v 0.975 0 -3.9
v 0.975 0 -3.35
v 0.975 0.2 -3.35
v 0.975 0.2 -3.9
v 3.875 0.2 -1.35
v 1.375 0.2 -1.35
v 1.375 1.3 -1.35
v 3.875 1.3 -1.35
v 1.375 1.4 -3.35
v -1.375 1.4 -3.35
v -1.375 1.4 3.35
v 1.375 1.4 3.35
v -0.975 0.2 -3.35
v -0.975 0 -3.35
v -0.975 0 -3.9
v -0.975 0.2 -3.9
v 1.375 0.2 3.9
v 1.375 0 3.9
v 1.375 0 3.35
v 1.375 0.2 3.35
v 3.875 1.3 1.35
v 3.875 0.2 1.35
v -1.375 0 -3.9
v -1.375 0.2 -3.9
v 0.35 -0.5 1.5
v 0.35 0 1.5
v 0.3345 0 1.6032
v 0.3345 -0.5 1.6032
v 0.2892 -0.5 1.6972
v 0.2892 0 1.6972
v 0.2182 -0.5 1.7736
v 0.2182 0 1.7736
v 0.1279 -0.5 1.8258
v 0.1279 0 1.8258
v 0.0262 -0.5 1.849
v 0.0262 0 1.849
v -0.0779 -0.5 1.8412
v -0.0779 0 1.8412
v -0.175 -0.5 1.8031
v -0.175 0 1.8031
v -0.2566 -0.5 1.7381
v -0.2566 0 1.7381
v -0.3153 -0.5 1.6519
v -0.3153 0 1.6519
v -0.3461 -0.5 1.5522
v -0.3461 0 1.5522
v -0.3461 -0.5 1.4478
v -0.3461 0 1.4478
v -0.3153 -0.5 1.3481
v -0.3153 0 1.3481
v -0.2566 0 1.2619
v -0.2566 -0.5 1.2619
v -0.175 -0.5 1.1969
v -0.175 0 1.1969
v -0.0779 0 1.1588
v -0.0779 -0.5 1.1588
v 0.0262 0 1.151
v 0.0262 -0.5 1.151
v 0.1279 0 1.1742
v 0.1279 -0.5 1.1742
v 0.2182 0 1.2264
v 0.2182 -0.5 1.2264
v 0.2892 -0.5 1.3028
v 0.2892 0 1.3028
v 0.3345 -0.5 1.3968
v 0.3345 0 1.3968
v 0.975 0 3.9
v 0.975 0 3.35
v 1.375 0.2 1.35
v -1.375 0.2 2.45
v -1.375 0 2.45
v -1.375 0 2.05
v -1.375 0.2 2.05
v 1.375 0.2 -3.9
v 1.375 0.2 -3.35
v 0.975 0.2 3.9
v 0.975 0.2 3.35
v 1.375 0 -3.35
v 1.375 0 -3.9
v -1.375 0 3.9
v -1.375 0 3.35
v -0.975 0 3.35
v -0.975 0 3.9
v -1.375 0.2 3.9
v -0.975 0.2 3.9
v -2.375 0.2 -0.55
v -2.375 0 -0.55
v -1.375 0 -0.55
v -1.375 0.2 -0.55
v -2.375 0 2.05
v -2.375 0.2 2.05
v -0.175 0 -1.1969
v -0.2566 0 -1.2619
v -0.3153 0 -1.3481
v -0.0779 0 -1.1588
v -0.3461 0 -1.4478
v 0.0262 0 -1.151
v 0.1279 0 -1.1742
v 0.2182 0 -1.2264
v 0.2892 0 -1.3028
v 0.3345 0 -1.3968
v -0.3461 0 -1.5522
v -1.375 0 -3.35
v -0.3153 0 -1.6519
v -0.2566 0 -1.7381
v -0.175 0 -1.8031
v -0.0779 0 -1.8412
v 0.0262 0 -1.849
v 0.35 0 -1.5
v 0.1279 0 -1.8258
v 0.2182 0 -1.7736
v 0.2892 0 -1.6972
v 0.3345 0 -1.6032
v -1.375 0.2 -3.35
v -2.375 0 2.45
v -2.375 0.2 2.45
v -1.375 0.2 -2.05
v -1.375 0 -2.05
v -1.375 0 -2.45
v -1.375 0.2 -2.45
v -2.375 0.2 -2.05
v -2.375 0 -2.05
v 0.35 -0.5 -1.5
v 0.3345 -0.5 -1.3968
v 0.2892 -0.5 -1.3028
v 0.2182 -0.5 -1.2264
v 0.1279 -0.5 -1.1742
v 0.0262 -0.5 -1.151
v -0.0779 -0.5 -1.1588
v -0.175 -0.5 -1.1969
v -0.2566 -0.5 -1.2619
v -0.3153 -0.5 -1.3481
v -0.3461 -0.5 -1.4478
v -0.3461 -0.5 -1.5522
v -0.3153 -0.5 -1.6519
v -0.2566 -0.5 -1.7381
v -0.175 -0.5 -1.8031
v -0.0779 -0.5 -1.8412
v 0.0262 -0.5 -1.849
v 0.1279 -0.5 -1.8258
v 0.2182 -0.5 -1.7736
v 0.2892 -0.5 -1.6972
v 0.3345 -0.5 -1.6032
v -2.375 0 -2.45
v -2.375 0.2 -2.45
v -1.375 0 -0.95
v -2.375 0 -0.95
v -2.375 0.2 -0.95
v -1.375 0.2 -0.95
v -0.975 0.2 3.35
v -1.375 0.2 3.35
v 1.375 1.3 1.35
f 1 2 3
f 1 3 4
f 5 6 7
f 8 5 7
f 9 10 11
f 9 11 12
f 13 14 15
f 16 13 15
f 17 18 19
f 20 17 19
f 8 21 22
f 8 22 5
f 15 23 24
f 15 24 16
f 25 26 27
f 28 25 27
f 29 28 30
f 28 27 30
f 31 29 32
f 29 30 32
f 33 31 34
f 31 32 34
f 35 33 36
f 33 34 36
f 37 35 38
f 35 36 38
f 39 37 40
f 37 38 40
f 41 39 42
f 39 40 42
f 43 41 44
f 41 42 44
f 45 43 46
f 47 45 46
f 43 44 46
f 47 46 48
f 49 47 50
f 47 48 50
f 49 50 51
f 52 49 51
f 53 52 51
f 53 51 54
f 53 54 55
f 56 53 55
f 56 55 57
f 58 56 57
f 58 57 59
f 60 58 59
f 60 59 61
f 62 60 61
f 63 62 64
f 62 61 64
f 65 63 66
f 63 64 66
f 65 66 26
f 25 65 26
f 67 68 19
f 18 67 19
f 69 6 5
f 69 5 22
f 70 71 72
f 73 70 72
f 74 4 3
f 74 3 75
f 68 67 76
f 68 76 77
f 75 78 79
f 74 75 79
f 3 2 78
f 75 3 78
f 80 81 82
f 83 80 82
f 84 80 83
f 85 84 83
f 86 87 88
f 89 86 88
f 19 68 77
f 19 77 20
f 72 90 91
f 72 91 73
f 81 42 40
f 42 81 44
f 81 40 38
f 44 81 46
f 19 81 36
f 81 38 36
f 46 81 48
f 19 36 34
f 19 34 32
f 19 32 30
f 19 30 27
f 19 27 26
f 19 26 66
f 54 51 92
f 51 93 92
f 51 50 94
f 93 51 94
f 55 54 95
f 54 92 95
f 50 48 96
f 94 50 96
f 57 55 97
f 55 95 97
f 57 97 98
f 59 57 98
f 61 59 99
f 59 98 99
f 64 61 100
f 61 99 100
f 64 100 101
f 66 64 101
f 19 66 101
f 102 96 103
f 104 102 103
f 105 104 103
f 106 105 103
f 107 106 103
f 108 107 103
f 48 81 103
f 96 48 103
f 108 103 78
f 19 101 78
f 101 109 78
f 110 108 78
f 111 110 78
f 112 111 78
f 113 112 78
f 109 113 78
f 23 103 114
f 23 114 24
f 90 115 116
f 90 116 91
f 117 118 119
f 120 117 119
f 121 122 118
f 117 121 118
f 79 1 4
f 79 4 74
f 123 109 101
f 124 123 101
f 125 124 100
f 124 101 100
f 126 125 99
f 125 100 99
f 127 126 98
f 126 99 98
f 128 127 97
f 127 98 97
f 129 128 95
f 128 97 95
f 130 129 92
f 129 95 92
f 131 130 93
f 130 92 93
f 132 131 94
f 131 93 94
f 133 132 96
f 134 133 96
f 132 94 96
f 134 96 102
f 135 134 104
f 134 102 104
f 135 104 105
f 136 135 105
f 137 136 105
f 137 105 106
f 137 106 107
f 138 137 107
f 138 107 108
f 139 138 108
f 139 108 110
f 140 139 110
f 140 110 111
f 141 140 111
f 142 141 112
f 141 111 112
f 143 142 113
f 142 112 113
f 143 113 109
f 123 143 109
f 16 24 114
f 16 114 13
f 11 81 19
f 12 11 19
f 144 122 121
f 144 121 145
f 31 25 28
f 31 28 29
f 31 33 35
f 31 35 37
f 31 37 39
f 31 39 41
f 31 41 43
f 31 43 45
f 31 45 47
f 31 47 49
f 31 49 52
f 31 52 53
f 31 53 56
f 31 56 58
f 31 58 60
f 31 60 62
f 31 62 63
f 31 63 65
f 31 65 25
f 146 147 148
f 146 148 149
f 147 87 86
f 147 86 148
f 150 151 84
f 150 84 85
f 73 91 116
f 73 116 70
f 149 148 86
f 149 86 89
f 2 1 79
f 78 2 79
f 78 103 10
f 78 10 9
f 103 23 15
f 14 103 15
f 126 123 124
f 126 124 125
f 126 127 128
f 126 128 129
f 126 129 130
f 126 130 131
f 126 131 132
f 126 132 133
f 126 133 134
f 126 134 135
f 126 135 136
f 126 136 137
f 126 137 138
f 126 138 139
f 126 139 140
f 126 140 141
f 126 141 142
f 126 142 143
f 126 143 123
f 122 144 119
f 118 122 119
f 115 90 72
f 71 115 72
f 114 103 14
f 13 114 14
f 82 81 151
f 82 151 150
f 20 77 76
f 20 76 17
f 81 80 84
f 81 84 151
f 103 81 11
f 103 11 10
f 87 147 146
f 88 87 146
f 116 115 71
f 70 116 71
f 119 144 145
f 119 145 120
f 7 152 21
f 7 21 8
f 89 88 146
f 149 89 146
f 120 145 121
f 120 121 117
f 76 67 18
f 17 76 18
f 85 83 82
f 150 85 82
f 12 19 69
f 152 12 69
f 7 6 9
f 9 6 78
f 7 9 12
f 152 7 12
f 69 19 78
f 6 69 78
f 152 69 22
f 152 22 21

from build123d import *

# Parameters (mm, degrees)
SKETCH_1_W        = 2.75
SKETCH_1_H        = 6.7
EXTRUDE_1_DEPTH   = 1.4
SKETCH_2_R        = 0.35
EXTRUDE_2_DEPTH   = 0.5
SKETCH_4_W        = 1
SKETCH_4_H        = 0.4
EXTRUDE_4_DEPTH   = 0.2
EXTRUDE_4_2_DEPTH = 0.2
EXTRUDE_4_3_DEPTH = 0.2
SKETCH_4_W_2      = 0.4
SKETCH_4_H_2      = 0.55
EXTRUDE_4_4_DEPTH = 0.2
EXTRUDE_4_5_DEPTH = 0.2
EXTRUDE_4_6_DEPTH = 0.2
EXTRUDE_4_7_DEPTH = 0.2
SKETCH_3_W        = 1.6
SKETCH_3_H        = 1.1
EXTRUDE_3_DEPTH   = 2.5


with BuildPart() as part:
    # 草图1 → 凸台-拉伸1 (new body)
    with BuildSketch(Plane(origin=(0, 0, 0), x_dir=(1, 0, 0), z_dir=(0, 1, 0))):
        Rectangle(SKETCH_1_W, SKETCH_1_H)
    extrude(amount=EXTRUDE_1_DEPTH)

    # 草图2 → 凸台-拉伸2 (add)
    with BuildSketch(Plane.XZ):
        with Locations((0, 1.5)):
            Circle(SKETCH_2_R)
        with Locations((0, -1.5)):
            Circle(SKETCH_2_R)
    extrude(amount=EXTRUDE_2_DEPTH)

    # 草图3 → 凸台-拉伸3 (add)
    with BuildSketch(Plane(origin=(1.375, 0, 0), x_dir=(0, 0, -1), z_dir=(1, 0, 0))):
        with Locations((0.55, 0.75)):
            Rectangle(SKETCH_3_W, SKETCH_3_H)
    extrude_3 = extrude(amount=EXTRUDE_3_DEPTH)

    # 镜向1: 凸台-拉伸3 across plane
    add(extrude_3.mirror(Plane.XY))


with BuildPart() as body_2:
    # 草图4 → 凸台-拉伸4 (new body)
    with BuildSketch(Plane(origin=(0, 0, 0), x_dir=(1, 0, 0), z_dir=(0, 1, 0))):
        with Locations((-1.875, 2.25)):
            Rectangle(SKETCH_4_W, SKETCH_4_H)
    extrude(amount=EXTRUDE_4_DEPTH)


with BuildPart() as body_3:
    # 草图4 → Extrude 4 2 (new body)
    with BuildSketch(Plane(origin=(0, 0, 0), x_dir=(1, 0, 0), z_dir=(0, 1, 0))):
        with Locations((-1.875, -2.25)):
            Rectangle(SKETCH_4_W, SKETCH_4_H)
    extrude(amount=EXTRUDE_4_2_DEPTH)


with BuildPart() as body_4:
    # 草图4 → Extrude 4 3 (new body)
    with BuildSketch(Plane(origin=(0, 0, 0), x_dir=(1, 0, 0), z_dir=(0, 1, 0))):
        with Locations((-1.875, 0.75)):
            Rectangle(SKETCH_4_W, SKETCH_4_H)
    extrude(amount=EXTRUDE_4_3_DEPTH)


with BuildPart() as body_5:
    # 草图4 → Extrude 4 4 (new body)
    with BuildSketch(Plane(origin=(0, 0, 0), x_dir=(1, 0, 0), z_dir=(0, 1, 0))):
        with Locations((-1.175, 3.625)):
            Rectangle(SKETCH_4_W_2, SKETCH_4_H_2)
    extrude(amount=EXTRUDE_4_4_DEPTH)


with BuildPart() as body_6:
    # 草图4 → Extrude 4 5 (new body)
    with BuildSketch(Plane(origin=(0, 0, 0), x_dir=(1, 0, 0), z_dir=(0, 1, 0))):
        with Locations((1.175, 3.625)):
            Rectangle(SKETCH_4_W_2, SKETCH_4_H_2)
    extrude(amount=EXTRUDE_4_5_DEPTH)


with BuildPart() as body_7:
    # 草图4 → Extrude 4 6 (new body)
    with BuildSketch(Plane(origin=(0, 0, 0), x_dir=(1, 0, 0), z_dir=(0, 1, 0))):
        with Locations((-1.175, -3.625)):
            Rectangle(SKETCH_4_W_2, SKETCH_4_H_2)
    extrude(amount=EXTRUDE_4_6_DEPTH)


with BuildPart() as body_8:
    # 草图4 → Extrude 4 7 (new body)
    with BuildSketch(Plane(origin=(0, 0, 0), x_dir=(1, 0, 0), z_dir=(0, 1, 0))):
        with Locations((1.175, -3.625)):
            Rectangle(SKETCH_4_W_2, SKETCH_4_H_2)
    extrude(amount=EXTRUDE_4_7_DEPTH)


solid = Compound([part.part, body_2.part, body_3.part, body_4.part, body_5.part, body_6.part, body_7.part, body_8.part])
